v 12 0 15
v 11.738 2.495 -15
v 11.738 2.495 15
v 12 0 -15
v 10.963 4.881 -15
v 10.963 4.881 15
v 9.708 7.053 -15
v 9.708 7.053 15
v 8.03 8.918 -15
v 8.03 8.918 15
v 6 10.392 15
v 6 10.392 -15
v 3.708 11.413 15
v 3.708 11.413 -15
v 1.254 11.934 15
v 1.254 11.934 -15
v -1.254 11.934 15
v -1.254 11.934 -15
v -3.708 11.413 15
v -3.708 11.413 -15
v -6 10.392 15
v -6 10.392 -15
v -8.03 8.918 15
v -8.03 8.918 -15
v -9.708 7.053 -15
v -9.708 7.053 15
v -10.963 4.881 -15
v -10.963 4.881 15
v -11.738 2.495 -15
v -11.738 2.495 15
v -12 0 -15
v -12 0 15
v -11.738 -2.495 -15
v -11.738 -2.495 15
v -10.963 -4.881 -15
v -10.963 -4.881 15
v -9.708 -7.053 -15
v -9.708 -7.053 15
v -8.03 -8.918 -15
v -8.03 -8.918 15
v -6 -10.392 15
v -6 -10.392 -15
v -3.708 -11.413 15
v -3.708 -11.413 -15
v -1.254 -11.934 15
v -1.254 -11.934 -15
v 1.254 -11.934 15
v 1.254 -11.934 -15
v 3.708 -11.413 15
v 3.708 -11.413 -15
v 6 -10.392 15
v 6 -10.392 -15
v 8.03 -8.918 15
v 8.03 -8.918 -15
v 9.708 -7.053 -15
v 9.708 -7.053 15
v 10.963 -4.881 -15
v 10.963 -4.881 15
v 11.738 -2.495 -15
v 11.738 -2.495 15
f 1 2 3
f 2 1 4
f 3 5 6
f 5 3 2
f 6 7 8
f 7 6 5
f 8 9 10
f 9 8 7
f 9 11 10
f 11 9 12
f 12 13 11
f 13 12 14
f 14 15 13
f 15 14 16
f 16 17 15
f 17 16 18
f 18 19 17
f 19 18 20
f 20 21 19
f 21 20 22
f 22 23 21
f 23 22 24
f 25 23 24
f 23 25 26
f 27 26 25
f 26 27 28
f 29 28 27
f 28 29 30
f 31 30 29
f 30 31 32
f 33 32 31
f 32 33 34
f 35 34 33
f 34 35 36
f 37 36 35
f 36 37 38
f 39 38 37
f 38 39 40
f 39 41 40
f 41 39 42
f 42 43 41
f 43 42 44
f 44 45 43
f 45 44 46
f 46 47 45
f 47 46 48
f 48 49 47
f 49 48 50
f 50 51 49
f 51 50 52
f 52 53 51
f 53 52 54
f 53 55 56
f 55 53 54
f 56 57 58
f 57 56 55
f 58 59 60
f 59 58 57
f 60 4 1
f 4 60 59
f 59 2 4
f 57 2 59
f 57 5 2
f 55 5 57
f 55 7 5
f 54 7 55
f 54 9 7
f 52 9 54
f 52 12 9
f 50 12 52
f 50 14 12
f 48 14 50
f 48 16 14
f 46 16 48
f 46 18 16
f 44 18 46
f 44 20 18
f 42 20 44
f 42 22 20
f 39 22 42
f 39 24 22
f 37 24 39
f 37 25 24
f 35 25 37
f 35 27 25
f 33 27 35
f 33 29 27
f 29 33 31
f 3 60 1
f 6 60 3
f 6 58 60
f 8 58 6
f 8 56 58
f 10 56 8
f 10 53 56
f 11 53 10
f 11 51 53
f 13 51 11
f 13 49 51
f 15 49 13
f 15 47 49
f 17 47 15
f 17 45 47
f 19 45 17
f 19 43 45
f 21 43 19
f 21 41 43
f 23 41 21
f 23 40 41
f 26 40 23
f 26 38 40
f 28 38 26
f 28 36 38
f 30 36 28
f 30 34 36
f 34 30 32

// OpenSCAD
// Generated by generate_scads.py
cylinder(h=30, r=12, center=true);
